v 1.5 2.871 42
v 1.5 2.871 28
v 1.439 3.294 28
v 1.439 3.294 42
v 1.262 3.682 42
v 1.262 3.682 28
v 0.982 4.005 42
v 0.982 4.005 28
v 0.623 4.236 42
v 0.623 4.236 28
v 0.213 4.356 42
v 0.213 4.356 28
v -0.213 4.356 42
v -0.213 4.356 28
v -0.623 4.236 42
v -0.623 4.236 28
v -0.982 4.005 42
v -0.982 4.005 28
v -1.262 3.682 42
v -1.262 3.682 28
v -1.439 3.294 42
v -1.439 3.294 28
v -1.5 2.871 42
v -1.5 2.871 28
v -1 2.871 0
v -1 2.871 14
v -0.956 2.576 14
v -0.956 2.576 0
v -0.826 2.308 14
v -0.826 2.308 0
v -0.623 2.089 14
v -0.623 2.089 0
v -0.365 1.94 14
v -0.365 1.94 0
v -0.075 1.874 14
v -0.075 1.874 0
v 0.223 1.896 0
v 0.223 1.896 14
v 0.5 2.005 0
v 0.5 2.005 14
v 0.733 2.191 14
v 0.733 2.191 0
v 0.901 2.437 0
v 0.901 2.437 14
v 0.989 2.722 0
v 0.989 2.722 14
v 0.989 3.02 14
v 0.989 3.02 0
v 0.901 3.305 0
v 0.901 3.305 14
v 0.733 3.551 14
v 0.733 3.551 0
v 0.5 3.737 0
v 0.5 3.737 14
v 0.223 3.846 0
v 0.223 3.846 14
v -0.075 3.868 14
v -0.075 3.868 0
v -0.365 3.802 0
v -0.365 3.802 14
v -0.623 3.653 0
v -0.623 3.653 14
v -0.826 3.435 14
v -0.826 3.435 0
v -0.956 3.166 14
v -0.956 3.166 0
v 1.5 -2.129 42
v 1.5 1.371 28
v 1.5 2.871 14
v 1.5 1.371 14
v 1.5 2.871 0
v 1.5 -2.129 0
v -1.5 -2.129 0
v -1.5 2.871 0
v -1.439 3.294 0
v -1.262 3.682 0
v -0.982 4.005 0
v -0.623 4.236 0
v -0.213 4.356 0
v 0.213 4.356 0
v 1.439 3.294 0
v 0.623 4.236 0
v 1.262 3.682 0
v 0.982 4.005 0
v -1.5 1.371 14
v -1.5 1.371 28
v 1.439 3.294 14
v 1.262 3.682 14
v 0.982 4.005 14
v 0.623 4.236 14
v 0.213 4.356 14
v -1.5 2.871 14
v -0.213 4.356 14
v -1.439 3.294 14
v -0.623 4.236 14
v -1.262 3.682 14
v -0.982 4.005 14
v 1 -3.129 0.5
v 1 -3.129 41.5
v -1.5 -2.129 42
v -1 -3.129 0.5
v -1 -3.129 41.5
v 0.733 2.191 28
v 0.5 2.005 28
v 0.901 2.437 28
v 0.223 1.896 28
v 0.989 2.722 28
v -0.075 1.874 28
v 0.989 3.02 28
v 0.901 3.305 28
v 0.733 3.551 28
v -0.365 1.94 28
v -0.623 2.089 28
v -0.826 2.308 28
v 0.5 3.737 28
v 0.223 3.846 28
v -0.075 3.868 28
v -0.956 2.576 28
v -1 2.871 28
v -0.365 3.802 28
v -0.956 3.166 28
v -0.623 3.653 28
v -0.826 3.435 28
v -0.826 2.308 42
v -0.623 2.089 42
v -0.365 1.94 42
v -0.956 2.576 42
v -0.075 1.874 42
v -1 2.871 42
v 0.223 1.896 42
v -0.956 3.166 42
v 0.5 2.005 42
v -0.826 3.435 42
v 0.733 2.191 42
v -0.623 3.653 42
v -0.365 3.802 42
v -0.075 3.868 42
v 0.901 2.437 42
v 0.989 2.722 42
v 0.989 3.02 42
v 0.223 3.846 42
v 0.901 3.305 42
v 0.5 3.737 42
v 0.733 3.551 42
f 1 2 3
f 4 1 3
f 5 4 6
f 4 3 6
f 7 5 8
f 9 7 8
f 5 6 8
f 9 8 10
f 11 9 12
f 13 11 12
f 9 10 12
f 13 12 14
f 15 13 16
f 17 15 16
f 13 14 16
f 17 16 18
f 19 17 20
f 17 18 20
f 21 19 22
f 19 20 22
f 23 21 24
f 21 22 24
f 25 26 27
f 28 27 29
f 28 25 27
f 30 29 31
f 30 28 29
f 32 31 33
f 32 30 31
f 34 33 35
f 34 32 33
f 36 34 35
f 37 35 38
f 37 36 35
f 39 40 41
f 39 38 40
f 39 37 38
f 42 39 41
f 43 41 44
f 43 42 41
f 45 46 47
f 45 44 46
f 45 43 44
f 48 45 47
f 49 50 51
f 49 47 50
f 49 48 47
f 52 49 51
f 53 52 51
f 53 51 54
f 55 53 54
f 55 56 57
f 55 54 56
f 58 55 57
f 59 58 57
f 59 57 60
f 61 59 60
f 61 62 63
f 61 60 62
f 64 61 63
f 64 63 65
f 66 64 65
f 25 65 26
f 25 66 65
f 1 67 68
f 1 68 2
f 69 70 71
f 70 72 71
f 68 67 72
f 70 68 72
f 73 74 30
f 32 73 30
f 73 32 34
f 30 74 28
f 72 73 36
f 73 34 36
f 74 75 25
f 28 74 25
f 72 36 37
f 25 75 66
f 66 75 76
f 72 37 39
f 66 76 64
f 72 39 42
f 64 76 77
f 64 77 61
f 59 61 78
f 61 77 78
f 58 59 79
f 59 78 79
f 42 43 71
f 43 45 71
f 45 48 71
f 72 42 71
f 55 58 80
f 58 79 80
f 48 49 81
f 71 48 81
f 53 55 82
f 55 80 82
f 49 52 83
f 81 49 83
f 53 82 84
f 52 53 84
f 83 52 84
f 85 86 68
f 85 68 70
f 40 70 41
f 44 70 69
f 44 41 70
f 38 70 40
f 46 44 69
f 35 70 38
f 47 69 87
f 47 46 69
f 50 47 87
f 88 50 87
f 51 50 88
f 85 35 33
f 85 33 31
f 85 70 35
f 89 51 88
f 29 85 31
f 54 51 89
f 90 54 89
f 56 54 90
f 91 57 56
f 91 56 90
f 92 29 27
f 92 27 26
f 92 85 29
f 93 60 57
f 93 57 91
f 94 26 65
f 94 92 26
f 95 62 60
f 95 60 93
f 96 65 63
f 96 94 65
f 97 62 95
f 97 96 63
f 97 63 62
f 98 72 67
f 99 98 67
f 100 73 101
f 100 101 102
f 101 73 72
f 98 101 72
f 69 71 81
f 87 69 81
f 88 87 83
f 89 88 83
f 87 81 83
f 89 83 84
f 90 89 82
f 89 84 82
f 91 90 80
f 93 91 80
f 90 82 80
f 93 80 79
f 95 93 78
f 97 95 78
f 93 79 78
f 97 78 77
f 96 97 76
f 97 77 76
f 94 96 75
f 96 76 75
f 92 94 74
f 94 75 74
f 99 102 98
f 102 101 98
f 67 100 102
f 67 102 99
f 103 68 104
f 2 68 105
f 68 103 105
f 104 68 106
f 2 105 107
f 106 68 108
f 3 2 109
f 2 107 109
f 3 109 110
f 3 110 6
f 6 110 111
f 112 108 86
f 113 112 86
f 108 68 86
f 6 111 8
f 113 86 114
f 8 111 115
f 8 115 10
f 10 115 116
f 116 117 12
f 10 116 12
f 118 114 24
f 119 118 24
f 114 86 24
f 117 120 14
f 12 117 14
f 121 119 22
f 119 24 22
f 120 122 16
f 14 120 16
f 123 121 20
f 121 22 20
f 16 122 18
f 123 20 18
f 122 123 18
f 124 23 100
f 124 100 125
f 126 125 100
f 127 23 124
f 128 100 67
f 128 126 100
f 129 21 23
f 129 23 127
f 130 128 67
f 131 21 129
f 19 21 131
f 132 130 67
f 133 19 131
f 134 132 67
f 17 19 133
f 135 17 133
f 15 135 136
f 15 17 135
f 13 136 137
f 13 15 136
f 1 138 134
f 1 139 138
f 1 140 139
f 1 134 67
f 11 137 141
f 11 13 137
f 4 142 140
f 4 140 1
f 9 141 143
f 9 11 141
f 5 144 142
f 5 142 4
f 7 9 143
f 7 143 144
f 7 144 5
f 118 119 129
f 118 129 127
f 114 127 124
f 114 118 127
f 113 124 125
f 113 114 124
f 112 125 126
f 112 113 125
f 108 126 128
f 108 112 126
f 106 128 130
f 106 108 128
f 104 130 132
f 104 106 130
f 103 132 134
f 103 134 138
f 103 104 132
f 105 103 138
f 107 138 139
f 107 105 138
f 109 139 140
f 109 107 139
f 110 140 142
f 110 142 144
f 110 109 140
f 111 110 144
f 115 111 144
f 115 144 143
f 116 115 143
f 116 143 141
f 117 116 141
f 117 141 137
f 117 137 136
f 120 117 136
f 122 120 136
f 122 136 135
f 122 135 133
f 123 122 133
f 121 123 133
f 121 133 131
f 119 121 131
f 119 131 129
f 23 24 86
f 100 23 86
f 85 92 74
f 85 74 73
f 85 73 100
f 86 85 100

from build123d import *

# Parameters (mm, degrees)
SKETCH1_R               = 1
BOSS_EXTRUDE1_DEPTH     = 42
CUT_EXTRUDE1_DEPTH      = 43.253492101
CUT_EXTRUDE1_DEPTH_BACK = 43.253492101
SKETCH2_W               = 14
SKETCH2_H               = 3
CHAMFER1_SIZE           = 0.5
CHAMFER1_SIZE2          = 1


with BuildPart() as part:
    # Sketch1 → Boss-Extrude1 (new body)
    with BuildSketch(Plane.XY):
        with BuildLine():
            Line((-1.5, 2.871223481), (-1.5, -3.128776519))
            Line((-1.5, -3.128776519), (1.5, -3.128776519))
            Line((1.5, -3.128776519), (1.5, 2.871223481))
            ThreePointArc((1.5, 2.871223481), (0, 4.371223481), (-1.5, 2.871223481))
        make_face()
        with Locations(Location((0, 2.871223481, 0), (0, 0, 180))):
            Circle(SKETCH1_R, mode=Mode.SUBTRACT)
    extrude(amount=BOSS_EXTRUDE1_DEPTH)

    # Sketch2 → Cut-Extrude1 (cut, two sides: drawn at the far end of the back side and taken through both)
    with BuildSketch(Plane(origin=(0, 0, 0), x_dir=(0, 0, -1), z_dir=(1, 0, 0)).offset(-CUT_EXTRUDE1_DEPTH_BACK)):
        with Locations((-21, 2.871223481)):
            Rectangle(SKETCH2_W, SKETCH2_H)
    extrude(amount=CUT_EXTRUDE1_DEPTH + CUT_EXTRUDE1_DEPTH_BACK, mode=Mode.SUBTRACT)

    # Chamfer1
    chamfer1_edges = [part.edges().sort_by_distance(p)[0] for p in [
        (0, -3.128776519, 42),
        (0, -3.128776519, 0),
        (1.5, -3.128776519, 21),
        (-1.5, -3.128776519, 21),
    ]]
    chamfer1_side = [part.faces().sort_by_distance(p)[0] for p in [
        (0, -3.128776519, 21),
    ]]
    chamfer(chamfer1_edges, length=CHAMFER1_SIZE, length2=CHAMFER1_SIZE2, reference=chamfer1_side[0])


solid = part.part
